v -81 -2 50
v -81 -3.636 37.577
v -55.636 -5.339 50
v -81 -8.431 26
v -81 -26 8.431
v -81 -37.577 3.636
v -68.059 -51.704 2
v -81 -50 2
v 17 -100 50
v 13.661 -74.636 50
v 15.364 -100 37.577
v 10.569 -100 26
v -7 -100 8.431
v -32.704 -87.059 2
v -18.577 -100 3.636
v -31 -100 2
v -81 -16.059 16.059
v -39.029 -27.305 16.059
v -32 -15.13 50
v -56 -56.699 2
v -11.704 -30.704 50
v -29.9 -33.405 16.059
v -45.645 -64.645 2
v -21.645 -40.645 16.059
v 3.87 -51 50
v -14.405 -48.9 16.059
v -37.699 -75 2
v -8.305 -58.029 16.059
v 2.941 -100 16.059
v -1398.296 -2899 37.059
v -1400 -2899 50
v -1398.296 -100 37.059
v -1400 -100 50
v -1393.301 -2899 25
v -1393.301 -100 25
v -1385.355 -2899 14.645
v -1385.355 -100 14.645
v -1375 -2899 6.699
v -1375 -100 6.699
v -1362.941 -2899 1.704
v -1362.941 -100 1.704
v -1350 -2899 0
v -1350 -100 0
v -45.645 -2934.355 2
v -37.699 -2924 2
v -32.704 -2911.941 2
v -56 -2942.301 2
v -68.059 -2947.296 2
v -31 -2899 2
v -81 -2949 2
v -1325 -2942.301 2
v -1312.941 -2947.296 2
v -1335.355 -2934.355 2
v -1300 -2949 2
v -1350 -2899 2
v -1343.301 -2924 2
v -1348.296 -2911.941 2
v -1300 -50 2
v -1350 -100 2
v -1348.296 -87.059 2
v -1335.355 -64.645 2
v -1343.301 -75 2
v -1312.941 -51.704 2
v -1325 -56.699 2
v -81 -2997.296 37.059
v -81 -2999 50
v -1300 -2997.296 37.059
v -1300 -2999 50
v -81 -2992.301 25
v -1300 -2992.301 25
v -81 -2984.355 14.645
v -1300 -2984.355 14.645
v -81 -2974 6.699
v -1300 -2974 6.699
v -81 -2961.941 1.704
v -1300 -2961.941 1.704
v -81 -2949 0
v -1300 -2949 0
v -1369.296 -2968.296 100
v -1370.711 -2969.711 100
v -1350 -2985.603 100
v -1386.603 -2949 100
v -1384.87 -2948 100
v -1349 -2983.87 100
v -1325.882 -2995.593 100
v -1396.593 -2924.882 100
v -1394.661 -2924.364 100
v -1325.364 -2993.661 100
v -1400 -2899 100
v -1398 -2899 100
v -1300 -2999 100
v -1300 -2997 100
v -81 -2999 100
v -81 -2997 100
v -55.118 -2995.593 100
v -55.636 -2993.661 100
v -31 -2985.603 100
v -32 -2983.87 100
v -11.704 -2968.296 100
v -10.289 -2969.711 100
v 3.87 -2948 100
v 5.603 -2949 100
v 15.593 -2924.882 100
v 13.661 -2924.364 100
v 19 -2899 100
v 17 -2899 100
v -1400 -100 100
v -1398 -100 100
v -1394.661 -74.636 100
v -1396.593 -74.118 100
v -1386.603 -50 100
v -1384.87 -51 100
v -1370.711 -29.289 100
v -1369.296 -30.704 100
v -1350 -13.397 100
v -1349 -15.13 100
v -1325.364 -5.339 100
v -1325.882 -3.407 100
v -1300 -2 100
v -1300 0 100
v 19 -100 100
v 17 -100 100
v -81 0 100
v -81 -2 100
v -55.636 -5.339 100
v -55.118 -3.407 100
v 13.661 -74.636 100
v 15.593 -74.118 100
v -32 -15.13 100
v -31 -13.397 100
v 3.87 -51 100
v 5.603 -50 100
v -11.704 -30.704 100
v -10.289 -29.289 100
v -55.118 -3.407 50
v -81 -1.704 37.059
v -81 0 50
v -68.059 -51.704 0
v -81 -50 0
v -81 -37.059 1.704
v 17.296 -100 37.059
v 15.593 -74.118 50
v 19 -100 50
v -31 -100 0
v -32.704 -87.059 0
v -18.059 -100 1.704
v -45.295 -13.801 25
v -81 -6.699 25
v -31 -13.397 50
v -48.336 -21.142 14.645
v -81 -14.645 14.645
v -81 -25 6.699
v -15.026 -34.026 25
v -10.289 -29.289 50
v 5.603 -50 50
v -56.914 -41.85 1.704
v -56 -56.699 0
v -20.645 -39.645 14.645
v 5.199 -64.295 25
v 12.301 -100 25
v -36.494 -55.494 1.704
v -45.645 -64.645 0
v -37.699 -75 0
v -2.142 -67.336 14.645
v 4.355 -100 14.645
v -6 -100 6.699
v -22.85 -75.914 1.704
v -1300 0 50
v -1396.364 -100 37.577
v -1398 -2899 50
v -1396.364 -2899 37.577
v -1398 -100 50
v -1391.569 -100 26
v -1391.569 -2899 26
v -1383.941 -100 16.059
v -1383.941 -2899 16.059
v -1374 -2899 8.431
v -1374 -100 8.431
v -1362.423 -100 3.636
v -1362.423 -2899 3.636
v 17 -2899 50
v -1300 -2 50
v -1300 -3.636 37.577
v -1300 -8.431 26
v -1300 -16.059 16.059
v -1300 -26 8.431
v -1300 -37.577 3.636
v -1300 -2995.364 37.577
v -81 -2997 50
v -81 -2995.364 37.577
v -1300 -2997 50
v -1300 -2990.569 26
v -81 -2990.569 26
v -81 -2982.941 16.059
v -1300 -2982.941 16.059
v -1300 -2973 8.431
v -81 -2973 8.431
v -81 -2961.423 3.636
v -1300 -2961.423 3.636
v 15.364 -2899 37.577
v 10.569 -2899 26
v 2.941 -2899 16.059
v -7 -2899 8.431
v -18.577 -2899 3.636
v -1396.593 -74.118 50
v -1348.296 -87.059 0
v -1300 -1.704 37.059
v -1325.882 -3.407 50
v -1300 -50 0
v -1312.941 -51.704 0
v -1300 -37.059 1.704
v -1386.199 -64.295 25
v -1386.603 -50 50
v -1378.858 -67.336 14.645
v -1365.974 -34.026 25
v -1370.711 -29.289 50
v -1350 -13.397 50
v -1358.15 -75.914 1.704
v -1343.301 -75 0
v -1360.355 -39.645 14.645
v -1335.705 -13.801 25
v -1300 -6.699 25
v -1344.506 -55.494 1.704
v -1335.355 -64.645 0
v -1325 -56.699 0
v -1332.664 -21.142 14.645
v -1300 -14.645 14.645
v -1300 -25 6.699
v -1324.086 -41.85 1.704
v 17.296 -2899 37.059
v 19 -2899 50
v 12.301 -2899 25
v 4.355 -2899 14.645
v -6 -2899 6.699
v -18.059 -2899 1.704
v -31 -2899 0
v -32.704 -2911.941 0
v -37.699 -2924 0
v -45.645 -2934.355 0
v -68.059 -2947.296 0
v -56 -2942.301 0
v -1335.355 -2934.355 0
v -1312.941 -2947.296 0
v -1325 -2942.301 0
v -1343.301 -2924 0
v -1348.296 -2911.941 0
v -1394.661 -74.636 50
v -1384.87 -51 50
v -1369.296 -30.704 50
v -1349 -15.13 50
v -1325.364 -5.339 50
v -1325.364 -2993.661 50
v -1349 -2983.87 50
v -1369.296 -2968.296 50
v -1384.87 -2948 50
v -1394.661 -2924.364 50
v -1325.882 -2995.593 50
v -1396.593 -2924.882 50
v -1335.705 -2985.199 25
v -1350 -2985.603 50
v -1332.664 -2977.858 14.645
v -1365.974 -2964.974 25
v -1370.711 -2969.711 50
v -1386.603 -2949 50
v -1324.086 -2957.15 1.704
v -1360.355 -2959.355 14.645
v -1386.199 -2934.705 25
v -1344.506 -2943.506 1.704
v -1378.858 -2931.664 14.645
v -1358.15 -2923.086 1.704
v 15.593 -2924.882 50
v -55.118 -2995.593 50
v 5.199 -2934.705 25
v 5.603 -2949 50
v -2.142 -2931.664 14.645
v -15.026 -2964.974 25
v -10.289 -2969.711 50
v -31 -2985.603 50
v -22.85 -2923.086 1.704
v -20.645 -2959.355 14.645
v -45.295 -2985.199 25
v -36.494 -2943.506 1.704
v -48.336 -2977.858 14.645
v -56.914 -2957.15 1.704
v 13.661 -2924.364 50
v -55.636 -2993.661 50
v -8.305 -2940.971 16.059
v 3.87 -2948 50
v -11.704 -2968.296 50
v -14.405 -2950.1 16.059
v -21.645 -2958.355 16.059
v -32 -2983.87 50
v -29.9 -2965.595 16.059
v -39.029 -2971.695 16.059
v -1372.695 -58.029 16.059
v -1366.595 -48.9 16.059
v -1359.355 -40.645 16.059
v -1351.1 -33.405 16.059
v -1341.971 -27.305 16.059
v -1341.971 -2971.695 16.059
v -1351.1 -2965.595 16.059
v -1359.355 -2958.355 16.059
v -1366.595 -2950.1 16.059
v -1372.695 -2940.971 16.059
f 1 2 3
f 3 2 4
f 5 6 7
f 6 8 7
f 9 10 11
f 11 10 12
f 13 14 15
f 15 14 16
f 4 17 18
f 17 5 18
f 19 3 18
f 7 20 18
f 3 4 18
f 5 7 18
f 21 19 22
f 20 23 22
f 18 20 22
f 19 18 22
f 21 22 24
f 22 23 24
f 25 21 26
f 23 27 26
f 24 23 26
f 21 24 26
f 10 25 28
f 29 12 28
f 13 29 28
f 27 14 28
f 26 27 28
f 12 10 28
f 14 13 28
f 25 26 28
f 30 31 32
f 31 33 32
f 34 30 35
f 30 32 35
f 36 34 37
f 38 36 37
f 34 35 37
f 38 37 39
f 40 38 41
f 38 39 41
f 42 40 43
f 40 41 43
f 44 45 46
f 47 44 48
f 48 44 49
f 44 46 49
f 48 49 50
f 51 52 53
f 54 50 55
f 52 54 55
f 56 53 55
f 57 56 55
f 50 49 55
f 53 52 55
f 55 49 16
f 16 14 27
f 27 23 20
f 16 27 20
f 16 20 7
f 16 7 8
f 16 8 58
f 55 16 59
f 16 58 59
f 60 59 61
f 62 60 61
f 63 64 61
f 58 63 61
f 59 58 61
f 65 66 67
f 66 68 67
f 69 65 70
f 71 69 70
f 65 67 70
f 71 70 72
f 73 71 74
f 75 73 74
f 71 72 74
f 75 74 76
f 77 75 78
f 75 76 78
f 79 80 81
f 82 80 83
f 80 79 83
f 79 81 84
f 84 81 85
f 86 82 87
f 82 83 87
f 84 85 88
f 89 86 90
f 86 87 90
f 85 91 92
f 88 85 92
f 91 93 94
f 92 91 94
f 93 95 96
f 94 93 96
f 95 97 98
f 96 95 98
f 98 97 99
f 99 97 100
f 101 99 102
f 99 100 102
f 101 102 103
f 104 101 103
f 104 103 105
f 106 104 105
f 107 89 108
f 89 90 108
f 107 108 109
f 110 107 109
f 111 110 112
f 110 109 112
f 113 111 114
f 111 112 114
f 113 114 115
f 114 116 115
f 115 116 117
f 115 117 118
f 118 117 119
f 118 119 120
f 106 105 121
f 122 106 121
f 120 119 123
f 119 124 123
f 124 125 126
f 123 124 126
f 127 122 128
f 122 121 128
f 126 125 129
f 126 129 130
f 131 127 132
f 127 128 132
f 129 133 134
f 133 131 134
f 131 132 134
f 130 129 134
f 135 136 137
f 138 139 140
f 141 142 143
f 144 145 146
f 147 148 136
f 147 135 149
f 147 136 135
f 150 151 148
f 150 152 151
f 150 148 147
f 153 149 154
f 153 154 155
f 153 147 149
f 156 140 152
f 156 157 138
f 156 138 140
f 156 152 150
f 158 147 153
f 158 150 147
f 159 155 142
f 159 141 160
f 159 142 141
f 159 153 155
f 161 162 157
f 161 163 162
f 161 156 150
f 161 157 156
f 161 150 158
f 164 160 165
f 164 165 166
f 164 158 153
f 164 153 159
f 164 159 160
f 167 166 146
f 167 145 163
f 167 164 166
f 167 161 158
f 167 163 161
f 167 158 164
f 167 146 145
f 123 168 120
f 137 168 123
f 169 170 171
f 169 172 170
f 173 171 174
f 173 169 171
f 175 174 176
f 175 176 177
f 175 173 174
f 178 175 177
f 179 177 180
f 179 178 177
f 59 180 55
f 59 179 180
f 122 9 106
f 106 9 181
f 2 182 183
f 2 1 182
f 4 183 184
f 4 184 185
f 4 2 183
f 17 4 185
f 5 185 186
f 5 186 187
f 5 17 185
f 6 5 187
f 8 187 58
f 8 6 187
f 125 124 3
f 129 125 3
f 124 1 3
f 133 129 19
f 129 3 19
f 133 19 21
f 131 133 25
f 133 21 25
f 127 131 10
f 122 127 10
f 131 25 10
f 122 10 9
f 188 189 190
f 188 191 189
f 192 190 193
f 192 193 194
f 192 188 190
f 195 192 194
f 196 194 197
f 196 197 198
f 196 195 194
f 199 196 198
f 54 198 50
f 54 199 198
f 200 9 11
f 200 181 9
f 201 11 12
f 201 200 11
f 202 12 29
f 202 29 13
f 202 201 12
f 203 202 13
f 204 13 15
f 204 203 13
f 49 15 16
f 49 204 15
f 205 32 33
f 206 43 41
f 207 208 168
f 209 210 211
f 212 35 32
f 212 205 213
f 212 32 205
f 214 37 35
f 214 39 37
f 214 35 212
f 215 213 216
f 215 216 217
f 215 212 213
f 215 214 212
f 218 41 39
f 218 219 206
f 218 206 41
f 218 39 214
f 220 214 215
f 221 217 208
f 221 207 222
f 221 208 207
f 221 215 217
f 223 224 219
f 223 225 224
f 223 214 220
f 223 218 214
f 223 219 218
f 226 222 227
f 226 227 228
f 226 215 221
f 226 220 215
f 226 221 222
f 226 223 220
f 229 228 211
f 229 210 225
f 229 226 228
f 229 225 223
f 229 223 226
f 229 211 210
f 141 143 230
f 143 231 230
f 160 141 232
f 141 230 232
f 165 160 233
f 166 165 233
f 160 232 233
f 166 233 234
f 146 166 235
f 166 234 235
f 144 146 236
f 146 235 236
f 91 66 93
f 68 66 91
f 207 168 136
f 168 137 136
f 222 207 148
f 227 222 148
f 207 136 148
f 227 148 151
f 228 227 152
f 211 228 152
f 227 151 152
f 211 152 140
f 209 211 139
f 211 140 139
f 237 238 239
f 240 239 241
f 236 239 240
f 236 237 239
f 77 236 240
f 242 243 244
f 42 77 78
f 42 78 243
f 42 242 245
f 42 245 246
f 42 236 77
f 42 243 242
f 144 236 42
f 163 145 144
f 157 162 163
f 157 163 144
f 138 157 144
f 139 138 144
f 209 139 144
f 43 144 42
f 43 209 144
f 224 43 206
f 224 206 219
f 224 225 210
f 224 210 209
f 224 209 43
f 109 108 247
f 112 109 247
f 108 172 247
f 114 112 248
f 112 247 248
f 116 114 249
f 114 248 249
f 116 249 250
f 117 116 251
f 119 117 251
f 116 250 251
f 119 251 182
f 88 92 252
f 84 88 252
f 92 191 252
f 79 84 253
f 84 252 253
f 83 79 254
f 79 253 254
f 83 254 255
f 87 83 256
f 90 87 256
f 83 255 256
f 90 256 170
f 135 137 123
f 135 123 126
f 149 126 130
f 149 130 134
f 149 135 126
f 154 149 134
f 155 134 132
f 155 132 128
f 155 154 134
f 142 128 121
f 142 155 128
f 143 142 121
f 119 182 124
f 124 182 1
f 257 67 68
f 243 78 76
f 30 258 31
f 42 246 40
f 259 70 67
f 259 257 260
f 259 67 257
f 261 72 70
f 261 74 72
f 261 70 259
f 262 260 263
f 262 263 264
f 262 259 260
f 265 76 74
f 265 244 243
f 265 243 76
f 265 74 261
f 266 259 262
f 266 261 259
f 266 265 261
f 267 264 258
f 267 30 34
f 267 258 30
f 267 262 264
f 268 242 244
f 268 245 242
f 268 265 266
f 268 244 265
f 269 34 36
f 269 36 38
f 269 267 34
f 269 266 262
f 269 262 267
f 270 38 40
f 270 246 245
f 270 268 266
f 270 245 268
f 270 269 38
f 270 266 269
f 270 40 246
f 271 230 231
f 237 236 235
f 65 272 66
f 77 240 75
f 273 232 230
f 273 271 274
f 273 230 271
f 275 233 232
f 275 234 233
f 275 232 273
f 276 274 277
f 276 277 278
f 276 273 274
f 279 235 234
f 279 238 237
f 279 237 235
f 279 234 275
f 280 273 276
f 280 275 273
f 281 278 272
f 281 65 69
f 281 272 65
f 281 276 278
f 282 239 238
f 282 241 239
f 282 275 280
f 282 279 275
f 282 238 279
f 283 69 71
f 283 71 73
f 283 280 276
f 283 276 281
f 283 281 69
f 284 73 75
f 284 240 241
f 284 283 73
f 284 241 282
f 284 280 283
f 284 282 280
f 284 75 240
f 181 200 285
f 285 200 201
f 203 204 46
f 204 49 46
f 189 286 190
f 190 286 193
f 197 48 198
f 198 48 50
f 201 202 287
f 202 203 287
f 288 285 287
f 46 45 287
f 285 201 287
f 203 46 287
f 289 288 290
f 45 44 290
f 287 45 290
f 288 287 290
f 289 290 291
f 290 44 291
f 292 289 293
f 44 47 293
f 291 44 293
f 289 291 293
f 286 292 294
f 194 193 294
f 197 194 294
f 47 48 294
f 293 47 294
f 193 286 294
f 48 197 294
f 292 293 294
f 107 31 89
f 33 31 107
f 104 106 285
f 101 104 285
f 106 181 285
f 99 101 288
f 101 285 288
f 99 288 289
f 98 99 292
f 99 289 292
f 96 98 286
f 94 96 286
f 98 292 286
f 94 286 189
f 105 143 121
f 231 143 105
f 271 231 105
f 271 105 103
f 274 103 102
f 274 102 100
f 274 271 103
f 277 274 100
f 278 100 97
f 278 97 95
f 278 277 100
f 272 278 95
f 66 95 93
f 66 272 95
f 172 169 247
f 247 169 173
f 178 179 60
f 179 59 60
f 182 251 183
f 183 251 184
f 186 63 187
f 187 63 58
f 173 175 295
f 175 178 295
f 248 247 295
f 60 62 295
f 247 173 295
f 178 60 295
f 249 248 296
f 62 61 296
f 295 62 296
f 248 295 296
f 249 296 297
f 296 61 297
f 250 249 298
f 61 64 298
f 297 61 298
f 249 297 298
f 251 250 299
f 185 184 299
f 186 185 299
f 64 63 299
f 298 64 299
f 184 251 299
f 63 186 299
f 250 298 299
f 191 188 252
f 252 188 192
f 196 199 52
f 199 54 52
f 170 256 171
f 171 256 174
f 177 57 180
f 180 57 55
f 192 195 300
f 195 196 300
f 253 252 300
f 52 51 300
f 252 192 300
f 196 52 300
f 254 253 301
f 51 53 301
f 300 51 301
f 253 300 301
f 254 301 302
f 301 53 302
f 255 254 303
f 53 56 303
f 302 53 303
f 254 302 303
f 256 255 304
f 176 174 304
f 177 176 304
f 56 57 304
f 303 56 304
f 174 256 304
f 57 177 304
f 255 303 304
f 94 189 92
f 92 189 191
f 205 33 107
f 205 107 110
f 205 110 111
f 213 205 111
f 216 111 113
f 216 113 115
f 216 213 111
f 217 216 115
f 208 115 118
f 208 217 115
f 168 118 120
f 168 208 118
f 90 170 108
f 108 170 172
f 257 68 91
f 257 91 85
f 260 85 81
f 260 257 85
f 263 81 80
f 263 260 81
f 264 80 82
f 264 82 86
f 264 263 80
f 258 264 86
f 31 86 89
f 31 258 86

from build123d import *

# Parameters (mm, degrees)
BOSS_EXTRUDE1_DEPTH = 200
FILLET1_R           = 50
SKETCH2_W           = 178.413306637
SKETCH2_H           = 3000
CUT_EXTRUDE1_DEPTH  = 1420
SHELL1_T            = -2


with BuildPart() as part:
    # Sketch1 → Boss-Extrude1 (new body)
    with BuildSketch(Plane.XY):
        with BuildLine():
            Line((-1300, 0), (-81, 0))
            ThreePointArc((-81, 0), (-10.289321881, -29.289321881), (19, -100))
            Line((19, -100), (19, -2899))
            ThreePointArc((19, -2899), (-10.289321881, -2969.710678119), (-81, -2999))
            Line((-81, -2999), (-1300, -2999))
            ThreePointArc((-1300, -2999), (-1370.710678119, -2969.710678119), (-1400, -2899))
            Line((-1400, -2899), (-1400, -100))
            ThreePointArc((-1400, -100), (-1370.710678119, -29.289321881), (-1300, 0))
        make_face()
    extrude(amount=BOSS_EXTRUDE1_DEPTH)

    # Fillet1
    fillet1_edges = [part.edges().sort_by_distance(p)[0] for p in [
        (19, -1499.5, 0),
        (-10.289321881, -2969.710678119, 0),
        (-690.5, -2999, 0),
        (-1370.710678119, -2969.710678119, 0),
        (-10.289321881, -2969.710678119, 200),
        (19, -1499.5, 200),
        (-10.289321881, -29.289321881, 200),
        (-690.5, 0, 200),
        (-1370.710678119, -29.289321881, 200),
        (-1400, -1499.5, 200),
        (-1370.710678119, -2969.710678119, 200),
        (-1400, -1499.5, 0),
        (-690.5, -2999, 200),
        (-1370.710678119, -29.289321881, 0),
        (-690.5, 0, 0),
        (-10.289321881, -29.289321881, 0),
    ]]
    fillet(fillet1_edges, radius=FILLET1_R)

    # Sketch2 → Cut-Extrude1 (cut, through all)
    with BuildSketch(Plane(origin=(19, 0, 0), x_dir=(0, 0, -1), z_dir=(1, 0, 0))):
        with Locations((-189.206653319, -1500)):
            Rectangle(SKETCH2_W, SKETCH2_H)
    extrude(amount=-CUT_EXTRUDE1_DEPTH, mode=Mode.SUBTRACT)

    # Shell1
    shell1_openings = [part.faces().sort_by_distance(p)[0] for p in [
        (-690.5, -1499.5, 100),
    ]]
    offset(amount=SHELL1_T, openings=shell1_openings, kind=Kind.INTERSECTION)


solid = part.part
